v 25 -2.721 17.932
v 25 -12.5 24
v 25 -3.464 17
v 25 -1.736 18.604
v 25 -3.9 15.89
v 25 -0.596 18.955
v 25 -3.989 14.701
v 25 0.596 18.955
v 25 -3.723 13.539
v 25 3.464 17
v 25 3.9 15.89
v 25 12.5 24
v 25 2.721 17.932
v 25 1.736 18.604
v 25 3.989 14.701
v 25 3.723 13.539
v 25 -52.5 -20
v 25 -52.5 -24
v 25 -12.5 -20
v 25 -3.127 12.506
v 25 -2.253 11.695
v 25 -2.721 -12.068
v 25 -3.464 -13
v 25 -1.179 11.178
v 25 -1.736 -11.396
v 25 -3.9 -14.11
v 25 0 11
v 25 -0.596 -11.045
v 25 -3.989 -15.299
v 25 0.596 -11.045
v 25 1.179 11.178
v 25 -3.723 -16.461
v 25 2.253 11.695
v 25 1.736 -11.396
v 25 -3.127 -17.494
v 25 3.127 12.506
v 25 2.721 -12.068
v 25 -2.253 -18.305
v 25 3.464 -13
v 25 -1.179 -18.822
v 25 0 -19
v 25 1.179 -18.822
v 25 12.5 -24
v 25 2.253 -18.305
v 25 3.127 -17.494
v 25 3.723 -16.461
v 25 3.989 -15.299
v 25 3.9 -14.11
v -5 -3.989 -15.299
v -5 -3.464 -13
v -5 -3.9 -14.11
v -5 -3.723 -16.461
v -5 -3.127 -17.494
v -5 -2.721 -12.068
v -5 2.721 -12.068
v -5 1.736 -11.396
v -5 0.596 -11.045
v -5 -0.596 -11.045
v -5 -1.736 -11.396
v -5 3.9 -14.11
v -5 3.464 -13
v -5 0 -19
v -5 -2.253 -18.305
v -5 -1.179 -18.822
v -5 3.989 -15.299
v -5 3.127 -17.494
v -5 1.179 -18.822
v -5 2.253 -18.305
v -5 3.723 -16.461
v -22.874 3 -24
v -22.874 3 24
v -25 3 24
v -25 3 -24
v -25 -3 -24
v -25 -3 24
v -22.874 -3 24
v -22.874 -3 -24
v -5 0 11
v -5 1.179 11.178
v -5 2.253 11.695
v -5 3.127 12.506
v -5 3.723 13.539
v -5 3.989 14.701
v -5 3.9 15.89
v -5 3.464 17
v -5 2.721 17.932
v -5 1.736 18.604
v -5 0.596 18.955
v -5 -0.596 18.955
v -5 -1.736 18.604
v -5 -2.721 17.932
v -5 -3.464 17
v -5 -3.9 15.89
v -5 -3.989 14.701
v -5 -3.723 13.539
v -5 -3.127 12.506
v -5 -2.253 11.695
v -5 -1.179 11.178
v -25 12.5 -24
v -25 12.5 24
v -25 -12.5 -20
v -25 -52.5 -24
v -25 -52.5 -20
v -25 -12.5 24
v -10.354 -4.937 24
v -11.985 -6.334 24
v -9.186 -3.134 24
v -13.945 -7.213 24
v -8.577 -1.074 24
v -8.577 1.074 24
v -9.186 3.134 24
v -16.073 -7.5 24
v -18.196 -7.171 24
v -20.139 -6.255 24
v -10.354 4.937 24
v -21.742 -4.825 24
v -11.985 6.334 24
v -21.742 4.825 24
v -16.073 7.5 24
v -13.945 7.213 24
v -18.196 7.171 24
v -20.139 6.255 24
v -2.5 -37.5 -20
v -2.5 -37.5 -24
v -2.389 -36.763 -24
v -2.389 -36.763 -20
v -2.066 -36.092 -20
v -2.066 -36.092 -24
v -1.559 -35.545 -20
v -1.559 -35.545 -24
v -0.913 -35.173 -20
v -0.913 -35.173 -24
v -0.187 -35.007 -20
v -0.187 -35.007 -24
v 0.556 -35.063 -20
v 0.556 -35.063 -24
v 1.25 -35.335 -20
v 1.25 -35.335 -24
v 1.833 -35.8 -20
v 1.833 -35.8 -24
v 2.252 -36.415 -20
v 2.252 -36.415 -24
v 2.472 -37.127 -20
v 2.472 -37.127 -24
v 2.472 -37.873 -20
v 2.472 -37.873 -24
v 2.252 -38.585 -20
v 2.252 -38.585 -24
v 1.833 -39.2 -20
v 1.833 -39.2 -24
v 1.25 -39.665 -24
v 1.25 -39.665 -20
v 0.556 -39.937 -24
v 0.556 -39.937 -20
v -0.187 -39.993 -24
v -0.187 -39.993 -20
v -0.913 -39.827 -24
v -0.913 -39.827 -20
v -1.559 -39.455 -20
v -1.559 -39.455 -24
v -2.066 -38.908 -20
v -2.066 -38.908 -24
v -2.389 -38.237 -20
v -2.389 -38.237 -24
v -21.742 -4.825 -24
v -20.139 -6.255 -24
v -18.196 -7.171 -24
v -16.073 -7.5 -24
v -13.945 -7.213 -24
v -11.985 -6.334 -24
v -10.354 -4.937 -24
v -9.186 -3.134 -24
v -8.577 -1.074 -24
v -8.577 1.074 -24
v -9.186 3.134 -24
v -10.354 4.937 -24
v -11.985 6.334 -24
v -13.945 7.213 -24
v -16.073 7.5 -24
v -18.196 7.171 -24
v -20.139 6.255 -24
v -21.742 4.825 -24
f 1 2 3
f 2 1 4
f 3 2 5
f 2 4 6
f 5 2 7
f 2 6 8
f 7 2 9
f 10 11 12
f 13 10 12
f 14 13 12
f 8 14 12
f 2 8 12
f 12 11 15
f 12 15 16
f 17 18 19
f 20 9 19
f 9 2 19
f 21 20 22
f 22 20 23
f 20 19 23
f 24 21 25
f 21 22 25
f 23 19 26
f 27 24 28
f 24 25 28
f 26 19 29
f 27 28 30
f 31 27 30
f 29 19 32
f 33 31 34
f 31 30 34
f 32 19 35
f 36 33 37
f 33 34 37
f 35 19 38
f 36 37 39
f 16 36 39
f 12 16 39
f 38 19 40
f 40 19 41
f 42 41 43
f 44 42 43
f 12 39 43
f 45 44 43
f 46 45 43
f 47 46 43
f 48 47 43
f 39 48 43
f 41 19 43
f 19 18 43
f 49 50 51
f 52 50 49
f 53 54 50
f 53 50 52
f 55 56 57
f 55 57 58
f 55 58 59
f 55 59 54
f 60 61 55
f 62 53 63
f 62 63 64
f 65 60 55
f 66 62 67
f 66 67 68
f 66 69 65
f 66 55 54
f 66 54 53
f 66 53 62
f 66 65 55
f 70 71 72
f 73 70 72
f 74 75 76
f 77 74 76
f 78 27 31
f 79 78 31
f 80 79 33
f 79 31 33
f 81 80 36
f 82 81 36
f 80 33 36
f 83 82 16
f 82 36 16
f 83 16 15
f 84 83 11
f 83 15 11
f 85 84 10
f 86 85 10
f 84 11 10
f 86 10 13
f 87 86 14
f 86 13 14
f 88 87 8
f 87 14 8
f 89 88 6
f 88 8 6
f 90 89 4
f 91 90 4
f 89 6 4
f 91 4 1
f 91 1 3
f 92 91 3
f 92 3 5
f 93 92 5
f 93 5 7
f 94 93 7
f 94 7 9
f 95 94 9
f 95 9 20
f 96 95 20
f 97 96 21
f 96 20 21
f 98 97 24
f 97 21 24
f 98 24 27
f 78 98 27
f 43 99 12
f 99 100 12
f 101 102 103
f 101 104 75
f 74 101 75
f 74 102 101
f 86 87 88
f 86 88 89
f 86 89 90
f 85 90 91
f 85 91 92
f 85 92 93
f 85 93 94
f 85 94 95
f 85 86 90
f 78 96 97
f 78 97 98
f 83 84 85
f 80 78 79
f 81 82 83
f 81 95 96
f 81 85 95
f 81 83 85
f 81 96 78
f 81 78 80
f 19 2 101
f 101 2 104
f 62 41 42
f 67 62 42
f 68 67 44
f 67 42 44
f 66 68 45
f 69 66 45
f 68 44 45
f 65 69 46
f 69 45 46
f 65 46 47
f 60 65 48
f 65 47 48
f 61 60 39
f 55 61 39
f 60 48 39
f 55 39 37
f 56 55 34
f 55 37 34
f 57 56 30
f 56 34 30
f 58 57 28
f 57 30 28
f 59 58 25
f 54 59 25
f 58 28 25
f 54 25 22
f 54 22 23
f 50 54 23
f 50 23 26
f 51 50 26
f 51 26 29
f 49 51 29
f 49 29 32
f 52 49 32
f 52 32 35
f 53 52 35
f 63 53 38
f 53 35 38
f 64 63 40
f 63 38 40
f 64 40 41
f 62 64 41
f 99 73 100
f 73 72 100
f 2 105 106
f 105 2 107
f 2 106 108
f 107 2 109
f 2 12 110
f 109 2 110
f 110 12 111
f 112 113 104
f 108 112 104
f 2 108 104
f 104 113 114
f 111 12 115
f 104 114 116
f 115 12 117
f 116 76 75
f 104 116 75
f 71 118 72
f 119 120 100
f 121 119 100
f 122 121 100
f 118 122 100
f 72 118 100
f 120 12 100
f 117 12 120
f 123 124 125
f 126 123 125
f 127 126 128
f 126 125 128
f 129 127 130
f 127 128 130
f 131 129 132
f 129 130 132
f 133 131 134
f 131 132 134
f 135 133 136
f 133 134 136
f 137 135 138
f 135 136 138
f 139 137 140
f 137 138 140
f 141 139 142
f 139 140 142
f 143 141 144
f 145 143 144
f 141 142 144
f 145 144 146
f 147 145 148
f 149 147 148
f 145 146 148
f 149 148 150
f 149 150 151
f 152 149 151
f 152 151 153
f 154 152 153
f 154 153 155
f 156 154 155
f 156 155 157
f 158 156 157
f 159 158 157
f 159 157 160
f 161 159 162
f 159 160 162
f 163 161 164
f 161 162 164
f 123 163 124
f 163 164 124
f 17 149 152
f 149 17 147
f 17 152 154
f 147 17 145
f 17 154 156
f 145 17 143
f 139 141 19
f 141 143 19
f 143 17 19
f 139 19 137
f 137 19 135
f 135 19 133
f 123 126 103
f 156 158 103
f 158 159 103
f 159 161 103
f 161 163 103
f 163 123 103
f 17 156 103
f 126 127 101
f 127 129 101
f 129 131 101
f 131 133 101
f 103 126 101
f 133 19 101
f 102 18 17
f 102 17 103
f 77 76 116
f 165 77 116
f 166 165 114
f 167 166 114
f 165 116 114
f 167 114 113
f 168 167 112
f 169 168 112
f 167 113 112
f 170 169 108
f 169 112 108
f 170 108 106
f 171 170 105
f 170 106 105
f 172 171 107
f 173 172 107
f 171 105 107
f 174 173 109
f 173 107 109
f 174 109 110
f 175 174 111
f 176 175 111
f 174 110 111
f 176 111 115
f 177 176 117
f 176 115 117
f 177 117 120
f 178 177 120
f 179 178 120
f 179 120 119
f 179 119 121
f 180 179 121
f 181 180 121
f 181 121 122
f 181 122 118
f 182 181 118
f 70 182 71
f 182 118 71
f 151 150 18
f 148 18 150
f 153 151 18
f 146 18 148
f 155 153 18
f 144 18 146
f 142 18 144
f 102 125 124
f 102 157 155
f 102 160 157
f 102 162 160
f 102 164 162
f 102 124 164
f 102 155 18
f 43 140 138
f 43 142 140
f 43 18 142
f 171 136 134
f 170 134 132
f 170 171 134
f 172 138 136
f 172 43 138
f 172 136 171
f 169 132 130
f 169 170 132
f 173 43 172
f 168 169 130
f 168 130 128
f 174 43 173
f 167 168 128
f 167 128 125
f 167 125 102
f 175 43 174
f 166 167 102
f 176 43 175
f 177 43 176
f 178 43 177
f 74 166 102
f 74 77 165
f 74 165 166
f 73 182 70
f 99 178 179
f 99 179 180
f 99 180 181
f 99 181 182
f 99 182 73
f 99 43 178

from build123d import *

# Parameters (mm, degrees)
BOSS_EXTRUDE1_DEPTH = 24
SKETCH2_R           = 4
CUT_EXTRUDE1_DEPTH  = 30
SKETCH5_W           = 50
SKETCH5_H           = 40
SKETCH5_R           = 2.5
BOSS_EXTRUDE3_DEPTH = 4


with BuildPart() as part:
    # Sketch1 → Boss-Extrude1 (new, symmetric)
    with BuildSketch(Plane.XY):
        with BuildLine():
            Line((-22.873863542, 3), (-25, 3))
            Line((-25, 3), (-25, 12.5))
            Line((-25, 12.5), (25, 12.5))
            Line((25, 12.5), (25, -12.5))
            Line((25, -12.5), (-25, -12.5))
            Line((-25, -12.5), (-25, -3))
            Line((-25, -3), (-22.873863542, -3))
            ThreePointArc((-22.873863542, -3), (-8.5, 0), (-22.873863542, 3))
        make_face()
    extrude(amount=BOSS_EXTRUDE1_DEPTH, both=True)

    # Sketch2 → Cut-Extrude1 (cut)
    with BuildSketch(Plane(origin=(25, 0, 0), x_dir=(0, 0, -1), z_dir=(1, 0, 0))):
        with Locations((-15, 0)):
            Circle(SKETCH2_R)
        with Locations((15, 0)):
            Circle(SKETCH2_R)
    extrude(amount=-CUT_EXTRUDE1_DEPTH, mode=Mode.SUBTRACT)

    # Sketch5 → Boss-Extrude3 (add)
    with BuildSketch(Plane(origin=(0, 0, -24), x_dir=(-1, 0, 0), z_dir=(0, 0, -1))):
        with Locations((0, -32.5)):
            Rectangle(SKETCH5_W, SKETCH5_H)
        with Locations((0, -37.5)):
            Circle(SKETCH5_R, mode=Mode.SUBTRACT)
    extrude(amount=-BOSS_EXTRUDE3_DEPTH)


solid = part.part
